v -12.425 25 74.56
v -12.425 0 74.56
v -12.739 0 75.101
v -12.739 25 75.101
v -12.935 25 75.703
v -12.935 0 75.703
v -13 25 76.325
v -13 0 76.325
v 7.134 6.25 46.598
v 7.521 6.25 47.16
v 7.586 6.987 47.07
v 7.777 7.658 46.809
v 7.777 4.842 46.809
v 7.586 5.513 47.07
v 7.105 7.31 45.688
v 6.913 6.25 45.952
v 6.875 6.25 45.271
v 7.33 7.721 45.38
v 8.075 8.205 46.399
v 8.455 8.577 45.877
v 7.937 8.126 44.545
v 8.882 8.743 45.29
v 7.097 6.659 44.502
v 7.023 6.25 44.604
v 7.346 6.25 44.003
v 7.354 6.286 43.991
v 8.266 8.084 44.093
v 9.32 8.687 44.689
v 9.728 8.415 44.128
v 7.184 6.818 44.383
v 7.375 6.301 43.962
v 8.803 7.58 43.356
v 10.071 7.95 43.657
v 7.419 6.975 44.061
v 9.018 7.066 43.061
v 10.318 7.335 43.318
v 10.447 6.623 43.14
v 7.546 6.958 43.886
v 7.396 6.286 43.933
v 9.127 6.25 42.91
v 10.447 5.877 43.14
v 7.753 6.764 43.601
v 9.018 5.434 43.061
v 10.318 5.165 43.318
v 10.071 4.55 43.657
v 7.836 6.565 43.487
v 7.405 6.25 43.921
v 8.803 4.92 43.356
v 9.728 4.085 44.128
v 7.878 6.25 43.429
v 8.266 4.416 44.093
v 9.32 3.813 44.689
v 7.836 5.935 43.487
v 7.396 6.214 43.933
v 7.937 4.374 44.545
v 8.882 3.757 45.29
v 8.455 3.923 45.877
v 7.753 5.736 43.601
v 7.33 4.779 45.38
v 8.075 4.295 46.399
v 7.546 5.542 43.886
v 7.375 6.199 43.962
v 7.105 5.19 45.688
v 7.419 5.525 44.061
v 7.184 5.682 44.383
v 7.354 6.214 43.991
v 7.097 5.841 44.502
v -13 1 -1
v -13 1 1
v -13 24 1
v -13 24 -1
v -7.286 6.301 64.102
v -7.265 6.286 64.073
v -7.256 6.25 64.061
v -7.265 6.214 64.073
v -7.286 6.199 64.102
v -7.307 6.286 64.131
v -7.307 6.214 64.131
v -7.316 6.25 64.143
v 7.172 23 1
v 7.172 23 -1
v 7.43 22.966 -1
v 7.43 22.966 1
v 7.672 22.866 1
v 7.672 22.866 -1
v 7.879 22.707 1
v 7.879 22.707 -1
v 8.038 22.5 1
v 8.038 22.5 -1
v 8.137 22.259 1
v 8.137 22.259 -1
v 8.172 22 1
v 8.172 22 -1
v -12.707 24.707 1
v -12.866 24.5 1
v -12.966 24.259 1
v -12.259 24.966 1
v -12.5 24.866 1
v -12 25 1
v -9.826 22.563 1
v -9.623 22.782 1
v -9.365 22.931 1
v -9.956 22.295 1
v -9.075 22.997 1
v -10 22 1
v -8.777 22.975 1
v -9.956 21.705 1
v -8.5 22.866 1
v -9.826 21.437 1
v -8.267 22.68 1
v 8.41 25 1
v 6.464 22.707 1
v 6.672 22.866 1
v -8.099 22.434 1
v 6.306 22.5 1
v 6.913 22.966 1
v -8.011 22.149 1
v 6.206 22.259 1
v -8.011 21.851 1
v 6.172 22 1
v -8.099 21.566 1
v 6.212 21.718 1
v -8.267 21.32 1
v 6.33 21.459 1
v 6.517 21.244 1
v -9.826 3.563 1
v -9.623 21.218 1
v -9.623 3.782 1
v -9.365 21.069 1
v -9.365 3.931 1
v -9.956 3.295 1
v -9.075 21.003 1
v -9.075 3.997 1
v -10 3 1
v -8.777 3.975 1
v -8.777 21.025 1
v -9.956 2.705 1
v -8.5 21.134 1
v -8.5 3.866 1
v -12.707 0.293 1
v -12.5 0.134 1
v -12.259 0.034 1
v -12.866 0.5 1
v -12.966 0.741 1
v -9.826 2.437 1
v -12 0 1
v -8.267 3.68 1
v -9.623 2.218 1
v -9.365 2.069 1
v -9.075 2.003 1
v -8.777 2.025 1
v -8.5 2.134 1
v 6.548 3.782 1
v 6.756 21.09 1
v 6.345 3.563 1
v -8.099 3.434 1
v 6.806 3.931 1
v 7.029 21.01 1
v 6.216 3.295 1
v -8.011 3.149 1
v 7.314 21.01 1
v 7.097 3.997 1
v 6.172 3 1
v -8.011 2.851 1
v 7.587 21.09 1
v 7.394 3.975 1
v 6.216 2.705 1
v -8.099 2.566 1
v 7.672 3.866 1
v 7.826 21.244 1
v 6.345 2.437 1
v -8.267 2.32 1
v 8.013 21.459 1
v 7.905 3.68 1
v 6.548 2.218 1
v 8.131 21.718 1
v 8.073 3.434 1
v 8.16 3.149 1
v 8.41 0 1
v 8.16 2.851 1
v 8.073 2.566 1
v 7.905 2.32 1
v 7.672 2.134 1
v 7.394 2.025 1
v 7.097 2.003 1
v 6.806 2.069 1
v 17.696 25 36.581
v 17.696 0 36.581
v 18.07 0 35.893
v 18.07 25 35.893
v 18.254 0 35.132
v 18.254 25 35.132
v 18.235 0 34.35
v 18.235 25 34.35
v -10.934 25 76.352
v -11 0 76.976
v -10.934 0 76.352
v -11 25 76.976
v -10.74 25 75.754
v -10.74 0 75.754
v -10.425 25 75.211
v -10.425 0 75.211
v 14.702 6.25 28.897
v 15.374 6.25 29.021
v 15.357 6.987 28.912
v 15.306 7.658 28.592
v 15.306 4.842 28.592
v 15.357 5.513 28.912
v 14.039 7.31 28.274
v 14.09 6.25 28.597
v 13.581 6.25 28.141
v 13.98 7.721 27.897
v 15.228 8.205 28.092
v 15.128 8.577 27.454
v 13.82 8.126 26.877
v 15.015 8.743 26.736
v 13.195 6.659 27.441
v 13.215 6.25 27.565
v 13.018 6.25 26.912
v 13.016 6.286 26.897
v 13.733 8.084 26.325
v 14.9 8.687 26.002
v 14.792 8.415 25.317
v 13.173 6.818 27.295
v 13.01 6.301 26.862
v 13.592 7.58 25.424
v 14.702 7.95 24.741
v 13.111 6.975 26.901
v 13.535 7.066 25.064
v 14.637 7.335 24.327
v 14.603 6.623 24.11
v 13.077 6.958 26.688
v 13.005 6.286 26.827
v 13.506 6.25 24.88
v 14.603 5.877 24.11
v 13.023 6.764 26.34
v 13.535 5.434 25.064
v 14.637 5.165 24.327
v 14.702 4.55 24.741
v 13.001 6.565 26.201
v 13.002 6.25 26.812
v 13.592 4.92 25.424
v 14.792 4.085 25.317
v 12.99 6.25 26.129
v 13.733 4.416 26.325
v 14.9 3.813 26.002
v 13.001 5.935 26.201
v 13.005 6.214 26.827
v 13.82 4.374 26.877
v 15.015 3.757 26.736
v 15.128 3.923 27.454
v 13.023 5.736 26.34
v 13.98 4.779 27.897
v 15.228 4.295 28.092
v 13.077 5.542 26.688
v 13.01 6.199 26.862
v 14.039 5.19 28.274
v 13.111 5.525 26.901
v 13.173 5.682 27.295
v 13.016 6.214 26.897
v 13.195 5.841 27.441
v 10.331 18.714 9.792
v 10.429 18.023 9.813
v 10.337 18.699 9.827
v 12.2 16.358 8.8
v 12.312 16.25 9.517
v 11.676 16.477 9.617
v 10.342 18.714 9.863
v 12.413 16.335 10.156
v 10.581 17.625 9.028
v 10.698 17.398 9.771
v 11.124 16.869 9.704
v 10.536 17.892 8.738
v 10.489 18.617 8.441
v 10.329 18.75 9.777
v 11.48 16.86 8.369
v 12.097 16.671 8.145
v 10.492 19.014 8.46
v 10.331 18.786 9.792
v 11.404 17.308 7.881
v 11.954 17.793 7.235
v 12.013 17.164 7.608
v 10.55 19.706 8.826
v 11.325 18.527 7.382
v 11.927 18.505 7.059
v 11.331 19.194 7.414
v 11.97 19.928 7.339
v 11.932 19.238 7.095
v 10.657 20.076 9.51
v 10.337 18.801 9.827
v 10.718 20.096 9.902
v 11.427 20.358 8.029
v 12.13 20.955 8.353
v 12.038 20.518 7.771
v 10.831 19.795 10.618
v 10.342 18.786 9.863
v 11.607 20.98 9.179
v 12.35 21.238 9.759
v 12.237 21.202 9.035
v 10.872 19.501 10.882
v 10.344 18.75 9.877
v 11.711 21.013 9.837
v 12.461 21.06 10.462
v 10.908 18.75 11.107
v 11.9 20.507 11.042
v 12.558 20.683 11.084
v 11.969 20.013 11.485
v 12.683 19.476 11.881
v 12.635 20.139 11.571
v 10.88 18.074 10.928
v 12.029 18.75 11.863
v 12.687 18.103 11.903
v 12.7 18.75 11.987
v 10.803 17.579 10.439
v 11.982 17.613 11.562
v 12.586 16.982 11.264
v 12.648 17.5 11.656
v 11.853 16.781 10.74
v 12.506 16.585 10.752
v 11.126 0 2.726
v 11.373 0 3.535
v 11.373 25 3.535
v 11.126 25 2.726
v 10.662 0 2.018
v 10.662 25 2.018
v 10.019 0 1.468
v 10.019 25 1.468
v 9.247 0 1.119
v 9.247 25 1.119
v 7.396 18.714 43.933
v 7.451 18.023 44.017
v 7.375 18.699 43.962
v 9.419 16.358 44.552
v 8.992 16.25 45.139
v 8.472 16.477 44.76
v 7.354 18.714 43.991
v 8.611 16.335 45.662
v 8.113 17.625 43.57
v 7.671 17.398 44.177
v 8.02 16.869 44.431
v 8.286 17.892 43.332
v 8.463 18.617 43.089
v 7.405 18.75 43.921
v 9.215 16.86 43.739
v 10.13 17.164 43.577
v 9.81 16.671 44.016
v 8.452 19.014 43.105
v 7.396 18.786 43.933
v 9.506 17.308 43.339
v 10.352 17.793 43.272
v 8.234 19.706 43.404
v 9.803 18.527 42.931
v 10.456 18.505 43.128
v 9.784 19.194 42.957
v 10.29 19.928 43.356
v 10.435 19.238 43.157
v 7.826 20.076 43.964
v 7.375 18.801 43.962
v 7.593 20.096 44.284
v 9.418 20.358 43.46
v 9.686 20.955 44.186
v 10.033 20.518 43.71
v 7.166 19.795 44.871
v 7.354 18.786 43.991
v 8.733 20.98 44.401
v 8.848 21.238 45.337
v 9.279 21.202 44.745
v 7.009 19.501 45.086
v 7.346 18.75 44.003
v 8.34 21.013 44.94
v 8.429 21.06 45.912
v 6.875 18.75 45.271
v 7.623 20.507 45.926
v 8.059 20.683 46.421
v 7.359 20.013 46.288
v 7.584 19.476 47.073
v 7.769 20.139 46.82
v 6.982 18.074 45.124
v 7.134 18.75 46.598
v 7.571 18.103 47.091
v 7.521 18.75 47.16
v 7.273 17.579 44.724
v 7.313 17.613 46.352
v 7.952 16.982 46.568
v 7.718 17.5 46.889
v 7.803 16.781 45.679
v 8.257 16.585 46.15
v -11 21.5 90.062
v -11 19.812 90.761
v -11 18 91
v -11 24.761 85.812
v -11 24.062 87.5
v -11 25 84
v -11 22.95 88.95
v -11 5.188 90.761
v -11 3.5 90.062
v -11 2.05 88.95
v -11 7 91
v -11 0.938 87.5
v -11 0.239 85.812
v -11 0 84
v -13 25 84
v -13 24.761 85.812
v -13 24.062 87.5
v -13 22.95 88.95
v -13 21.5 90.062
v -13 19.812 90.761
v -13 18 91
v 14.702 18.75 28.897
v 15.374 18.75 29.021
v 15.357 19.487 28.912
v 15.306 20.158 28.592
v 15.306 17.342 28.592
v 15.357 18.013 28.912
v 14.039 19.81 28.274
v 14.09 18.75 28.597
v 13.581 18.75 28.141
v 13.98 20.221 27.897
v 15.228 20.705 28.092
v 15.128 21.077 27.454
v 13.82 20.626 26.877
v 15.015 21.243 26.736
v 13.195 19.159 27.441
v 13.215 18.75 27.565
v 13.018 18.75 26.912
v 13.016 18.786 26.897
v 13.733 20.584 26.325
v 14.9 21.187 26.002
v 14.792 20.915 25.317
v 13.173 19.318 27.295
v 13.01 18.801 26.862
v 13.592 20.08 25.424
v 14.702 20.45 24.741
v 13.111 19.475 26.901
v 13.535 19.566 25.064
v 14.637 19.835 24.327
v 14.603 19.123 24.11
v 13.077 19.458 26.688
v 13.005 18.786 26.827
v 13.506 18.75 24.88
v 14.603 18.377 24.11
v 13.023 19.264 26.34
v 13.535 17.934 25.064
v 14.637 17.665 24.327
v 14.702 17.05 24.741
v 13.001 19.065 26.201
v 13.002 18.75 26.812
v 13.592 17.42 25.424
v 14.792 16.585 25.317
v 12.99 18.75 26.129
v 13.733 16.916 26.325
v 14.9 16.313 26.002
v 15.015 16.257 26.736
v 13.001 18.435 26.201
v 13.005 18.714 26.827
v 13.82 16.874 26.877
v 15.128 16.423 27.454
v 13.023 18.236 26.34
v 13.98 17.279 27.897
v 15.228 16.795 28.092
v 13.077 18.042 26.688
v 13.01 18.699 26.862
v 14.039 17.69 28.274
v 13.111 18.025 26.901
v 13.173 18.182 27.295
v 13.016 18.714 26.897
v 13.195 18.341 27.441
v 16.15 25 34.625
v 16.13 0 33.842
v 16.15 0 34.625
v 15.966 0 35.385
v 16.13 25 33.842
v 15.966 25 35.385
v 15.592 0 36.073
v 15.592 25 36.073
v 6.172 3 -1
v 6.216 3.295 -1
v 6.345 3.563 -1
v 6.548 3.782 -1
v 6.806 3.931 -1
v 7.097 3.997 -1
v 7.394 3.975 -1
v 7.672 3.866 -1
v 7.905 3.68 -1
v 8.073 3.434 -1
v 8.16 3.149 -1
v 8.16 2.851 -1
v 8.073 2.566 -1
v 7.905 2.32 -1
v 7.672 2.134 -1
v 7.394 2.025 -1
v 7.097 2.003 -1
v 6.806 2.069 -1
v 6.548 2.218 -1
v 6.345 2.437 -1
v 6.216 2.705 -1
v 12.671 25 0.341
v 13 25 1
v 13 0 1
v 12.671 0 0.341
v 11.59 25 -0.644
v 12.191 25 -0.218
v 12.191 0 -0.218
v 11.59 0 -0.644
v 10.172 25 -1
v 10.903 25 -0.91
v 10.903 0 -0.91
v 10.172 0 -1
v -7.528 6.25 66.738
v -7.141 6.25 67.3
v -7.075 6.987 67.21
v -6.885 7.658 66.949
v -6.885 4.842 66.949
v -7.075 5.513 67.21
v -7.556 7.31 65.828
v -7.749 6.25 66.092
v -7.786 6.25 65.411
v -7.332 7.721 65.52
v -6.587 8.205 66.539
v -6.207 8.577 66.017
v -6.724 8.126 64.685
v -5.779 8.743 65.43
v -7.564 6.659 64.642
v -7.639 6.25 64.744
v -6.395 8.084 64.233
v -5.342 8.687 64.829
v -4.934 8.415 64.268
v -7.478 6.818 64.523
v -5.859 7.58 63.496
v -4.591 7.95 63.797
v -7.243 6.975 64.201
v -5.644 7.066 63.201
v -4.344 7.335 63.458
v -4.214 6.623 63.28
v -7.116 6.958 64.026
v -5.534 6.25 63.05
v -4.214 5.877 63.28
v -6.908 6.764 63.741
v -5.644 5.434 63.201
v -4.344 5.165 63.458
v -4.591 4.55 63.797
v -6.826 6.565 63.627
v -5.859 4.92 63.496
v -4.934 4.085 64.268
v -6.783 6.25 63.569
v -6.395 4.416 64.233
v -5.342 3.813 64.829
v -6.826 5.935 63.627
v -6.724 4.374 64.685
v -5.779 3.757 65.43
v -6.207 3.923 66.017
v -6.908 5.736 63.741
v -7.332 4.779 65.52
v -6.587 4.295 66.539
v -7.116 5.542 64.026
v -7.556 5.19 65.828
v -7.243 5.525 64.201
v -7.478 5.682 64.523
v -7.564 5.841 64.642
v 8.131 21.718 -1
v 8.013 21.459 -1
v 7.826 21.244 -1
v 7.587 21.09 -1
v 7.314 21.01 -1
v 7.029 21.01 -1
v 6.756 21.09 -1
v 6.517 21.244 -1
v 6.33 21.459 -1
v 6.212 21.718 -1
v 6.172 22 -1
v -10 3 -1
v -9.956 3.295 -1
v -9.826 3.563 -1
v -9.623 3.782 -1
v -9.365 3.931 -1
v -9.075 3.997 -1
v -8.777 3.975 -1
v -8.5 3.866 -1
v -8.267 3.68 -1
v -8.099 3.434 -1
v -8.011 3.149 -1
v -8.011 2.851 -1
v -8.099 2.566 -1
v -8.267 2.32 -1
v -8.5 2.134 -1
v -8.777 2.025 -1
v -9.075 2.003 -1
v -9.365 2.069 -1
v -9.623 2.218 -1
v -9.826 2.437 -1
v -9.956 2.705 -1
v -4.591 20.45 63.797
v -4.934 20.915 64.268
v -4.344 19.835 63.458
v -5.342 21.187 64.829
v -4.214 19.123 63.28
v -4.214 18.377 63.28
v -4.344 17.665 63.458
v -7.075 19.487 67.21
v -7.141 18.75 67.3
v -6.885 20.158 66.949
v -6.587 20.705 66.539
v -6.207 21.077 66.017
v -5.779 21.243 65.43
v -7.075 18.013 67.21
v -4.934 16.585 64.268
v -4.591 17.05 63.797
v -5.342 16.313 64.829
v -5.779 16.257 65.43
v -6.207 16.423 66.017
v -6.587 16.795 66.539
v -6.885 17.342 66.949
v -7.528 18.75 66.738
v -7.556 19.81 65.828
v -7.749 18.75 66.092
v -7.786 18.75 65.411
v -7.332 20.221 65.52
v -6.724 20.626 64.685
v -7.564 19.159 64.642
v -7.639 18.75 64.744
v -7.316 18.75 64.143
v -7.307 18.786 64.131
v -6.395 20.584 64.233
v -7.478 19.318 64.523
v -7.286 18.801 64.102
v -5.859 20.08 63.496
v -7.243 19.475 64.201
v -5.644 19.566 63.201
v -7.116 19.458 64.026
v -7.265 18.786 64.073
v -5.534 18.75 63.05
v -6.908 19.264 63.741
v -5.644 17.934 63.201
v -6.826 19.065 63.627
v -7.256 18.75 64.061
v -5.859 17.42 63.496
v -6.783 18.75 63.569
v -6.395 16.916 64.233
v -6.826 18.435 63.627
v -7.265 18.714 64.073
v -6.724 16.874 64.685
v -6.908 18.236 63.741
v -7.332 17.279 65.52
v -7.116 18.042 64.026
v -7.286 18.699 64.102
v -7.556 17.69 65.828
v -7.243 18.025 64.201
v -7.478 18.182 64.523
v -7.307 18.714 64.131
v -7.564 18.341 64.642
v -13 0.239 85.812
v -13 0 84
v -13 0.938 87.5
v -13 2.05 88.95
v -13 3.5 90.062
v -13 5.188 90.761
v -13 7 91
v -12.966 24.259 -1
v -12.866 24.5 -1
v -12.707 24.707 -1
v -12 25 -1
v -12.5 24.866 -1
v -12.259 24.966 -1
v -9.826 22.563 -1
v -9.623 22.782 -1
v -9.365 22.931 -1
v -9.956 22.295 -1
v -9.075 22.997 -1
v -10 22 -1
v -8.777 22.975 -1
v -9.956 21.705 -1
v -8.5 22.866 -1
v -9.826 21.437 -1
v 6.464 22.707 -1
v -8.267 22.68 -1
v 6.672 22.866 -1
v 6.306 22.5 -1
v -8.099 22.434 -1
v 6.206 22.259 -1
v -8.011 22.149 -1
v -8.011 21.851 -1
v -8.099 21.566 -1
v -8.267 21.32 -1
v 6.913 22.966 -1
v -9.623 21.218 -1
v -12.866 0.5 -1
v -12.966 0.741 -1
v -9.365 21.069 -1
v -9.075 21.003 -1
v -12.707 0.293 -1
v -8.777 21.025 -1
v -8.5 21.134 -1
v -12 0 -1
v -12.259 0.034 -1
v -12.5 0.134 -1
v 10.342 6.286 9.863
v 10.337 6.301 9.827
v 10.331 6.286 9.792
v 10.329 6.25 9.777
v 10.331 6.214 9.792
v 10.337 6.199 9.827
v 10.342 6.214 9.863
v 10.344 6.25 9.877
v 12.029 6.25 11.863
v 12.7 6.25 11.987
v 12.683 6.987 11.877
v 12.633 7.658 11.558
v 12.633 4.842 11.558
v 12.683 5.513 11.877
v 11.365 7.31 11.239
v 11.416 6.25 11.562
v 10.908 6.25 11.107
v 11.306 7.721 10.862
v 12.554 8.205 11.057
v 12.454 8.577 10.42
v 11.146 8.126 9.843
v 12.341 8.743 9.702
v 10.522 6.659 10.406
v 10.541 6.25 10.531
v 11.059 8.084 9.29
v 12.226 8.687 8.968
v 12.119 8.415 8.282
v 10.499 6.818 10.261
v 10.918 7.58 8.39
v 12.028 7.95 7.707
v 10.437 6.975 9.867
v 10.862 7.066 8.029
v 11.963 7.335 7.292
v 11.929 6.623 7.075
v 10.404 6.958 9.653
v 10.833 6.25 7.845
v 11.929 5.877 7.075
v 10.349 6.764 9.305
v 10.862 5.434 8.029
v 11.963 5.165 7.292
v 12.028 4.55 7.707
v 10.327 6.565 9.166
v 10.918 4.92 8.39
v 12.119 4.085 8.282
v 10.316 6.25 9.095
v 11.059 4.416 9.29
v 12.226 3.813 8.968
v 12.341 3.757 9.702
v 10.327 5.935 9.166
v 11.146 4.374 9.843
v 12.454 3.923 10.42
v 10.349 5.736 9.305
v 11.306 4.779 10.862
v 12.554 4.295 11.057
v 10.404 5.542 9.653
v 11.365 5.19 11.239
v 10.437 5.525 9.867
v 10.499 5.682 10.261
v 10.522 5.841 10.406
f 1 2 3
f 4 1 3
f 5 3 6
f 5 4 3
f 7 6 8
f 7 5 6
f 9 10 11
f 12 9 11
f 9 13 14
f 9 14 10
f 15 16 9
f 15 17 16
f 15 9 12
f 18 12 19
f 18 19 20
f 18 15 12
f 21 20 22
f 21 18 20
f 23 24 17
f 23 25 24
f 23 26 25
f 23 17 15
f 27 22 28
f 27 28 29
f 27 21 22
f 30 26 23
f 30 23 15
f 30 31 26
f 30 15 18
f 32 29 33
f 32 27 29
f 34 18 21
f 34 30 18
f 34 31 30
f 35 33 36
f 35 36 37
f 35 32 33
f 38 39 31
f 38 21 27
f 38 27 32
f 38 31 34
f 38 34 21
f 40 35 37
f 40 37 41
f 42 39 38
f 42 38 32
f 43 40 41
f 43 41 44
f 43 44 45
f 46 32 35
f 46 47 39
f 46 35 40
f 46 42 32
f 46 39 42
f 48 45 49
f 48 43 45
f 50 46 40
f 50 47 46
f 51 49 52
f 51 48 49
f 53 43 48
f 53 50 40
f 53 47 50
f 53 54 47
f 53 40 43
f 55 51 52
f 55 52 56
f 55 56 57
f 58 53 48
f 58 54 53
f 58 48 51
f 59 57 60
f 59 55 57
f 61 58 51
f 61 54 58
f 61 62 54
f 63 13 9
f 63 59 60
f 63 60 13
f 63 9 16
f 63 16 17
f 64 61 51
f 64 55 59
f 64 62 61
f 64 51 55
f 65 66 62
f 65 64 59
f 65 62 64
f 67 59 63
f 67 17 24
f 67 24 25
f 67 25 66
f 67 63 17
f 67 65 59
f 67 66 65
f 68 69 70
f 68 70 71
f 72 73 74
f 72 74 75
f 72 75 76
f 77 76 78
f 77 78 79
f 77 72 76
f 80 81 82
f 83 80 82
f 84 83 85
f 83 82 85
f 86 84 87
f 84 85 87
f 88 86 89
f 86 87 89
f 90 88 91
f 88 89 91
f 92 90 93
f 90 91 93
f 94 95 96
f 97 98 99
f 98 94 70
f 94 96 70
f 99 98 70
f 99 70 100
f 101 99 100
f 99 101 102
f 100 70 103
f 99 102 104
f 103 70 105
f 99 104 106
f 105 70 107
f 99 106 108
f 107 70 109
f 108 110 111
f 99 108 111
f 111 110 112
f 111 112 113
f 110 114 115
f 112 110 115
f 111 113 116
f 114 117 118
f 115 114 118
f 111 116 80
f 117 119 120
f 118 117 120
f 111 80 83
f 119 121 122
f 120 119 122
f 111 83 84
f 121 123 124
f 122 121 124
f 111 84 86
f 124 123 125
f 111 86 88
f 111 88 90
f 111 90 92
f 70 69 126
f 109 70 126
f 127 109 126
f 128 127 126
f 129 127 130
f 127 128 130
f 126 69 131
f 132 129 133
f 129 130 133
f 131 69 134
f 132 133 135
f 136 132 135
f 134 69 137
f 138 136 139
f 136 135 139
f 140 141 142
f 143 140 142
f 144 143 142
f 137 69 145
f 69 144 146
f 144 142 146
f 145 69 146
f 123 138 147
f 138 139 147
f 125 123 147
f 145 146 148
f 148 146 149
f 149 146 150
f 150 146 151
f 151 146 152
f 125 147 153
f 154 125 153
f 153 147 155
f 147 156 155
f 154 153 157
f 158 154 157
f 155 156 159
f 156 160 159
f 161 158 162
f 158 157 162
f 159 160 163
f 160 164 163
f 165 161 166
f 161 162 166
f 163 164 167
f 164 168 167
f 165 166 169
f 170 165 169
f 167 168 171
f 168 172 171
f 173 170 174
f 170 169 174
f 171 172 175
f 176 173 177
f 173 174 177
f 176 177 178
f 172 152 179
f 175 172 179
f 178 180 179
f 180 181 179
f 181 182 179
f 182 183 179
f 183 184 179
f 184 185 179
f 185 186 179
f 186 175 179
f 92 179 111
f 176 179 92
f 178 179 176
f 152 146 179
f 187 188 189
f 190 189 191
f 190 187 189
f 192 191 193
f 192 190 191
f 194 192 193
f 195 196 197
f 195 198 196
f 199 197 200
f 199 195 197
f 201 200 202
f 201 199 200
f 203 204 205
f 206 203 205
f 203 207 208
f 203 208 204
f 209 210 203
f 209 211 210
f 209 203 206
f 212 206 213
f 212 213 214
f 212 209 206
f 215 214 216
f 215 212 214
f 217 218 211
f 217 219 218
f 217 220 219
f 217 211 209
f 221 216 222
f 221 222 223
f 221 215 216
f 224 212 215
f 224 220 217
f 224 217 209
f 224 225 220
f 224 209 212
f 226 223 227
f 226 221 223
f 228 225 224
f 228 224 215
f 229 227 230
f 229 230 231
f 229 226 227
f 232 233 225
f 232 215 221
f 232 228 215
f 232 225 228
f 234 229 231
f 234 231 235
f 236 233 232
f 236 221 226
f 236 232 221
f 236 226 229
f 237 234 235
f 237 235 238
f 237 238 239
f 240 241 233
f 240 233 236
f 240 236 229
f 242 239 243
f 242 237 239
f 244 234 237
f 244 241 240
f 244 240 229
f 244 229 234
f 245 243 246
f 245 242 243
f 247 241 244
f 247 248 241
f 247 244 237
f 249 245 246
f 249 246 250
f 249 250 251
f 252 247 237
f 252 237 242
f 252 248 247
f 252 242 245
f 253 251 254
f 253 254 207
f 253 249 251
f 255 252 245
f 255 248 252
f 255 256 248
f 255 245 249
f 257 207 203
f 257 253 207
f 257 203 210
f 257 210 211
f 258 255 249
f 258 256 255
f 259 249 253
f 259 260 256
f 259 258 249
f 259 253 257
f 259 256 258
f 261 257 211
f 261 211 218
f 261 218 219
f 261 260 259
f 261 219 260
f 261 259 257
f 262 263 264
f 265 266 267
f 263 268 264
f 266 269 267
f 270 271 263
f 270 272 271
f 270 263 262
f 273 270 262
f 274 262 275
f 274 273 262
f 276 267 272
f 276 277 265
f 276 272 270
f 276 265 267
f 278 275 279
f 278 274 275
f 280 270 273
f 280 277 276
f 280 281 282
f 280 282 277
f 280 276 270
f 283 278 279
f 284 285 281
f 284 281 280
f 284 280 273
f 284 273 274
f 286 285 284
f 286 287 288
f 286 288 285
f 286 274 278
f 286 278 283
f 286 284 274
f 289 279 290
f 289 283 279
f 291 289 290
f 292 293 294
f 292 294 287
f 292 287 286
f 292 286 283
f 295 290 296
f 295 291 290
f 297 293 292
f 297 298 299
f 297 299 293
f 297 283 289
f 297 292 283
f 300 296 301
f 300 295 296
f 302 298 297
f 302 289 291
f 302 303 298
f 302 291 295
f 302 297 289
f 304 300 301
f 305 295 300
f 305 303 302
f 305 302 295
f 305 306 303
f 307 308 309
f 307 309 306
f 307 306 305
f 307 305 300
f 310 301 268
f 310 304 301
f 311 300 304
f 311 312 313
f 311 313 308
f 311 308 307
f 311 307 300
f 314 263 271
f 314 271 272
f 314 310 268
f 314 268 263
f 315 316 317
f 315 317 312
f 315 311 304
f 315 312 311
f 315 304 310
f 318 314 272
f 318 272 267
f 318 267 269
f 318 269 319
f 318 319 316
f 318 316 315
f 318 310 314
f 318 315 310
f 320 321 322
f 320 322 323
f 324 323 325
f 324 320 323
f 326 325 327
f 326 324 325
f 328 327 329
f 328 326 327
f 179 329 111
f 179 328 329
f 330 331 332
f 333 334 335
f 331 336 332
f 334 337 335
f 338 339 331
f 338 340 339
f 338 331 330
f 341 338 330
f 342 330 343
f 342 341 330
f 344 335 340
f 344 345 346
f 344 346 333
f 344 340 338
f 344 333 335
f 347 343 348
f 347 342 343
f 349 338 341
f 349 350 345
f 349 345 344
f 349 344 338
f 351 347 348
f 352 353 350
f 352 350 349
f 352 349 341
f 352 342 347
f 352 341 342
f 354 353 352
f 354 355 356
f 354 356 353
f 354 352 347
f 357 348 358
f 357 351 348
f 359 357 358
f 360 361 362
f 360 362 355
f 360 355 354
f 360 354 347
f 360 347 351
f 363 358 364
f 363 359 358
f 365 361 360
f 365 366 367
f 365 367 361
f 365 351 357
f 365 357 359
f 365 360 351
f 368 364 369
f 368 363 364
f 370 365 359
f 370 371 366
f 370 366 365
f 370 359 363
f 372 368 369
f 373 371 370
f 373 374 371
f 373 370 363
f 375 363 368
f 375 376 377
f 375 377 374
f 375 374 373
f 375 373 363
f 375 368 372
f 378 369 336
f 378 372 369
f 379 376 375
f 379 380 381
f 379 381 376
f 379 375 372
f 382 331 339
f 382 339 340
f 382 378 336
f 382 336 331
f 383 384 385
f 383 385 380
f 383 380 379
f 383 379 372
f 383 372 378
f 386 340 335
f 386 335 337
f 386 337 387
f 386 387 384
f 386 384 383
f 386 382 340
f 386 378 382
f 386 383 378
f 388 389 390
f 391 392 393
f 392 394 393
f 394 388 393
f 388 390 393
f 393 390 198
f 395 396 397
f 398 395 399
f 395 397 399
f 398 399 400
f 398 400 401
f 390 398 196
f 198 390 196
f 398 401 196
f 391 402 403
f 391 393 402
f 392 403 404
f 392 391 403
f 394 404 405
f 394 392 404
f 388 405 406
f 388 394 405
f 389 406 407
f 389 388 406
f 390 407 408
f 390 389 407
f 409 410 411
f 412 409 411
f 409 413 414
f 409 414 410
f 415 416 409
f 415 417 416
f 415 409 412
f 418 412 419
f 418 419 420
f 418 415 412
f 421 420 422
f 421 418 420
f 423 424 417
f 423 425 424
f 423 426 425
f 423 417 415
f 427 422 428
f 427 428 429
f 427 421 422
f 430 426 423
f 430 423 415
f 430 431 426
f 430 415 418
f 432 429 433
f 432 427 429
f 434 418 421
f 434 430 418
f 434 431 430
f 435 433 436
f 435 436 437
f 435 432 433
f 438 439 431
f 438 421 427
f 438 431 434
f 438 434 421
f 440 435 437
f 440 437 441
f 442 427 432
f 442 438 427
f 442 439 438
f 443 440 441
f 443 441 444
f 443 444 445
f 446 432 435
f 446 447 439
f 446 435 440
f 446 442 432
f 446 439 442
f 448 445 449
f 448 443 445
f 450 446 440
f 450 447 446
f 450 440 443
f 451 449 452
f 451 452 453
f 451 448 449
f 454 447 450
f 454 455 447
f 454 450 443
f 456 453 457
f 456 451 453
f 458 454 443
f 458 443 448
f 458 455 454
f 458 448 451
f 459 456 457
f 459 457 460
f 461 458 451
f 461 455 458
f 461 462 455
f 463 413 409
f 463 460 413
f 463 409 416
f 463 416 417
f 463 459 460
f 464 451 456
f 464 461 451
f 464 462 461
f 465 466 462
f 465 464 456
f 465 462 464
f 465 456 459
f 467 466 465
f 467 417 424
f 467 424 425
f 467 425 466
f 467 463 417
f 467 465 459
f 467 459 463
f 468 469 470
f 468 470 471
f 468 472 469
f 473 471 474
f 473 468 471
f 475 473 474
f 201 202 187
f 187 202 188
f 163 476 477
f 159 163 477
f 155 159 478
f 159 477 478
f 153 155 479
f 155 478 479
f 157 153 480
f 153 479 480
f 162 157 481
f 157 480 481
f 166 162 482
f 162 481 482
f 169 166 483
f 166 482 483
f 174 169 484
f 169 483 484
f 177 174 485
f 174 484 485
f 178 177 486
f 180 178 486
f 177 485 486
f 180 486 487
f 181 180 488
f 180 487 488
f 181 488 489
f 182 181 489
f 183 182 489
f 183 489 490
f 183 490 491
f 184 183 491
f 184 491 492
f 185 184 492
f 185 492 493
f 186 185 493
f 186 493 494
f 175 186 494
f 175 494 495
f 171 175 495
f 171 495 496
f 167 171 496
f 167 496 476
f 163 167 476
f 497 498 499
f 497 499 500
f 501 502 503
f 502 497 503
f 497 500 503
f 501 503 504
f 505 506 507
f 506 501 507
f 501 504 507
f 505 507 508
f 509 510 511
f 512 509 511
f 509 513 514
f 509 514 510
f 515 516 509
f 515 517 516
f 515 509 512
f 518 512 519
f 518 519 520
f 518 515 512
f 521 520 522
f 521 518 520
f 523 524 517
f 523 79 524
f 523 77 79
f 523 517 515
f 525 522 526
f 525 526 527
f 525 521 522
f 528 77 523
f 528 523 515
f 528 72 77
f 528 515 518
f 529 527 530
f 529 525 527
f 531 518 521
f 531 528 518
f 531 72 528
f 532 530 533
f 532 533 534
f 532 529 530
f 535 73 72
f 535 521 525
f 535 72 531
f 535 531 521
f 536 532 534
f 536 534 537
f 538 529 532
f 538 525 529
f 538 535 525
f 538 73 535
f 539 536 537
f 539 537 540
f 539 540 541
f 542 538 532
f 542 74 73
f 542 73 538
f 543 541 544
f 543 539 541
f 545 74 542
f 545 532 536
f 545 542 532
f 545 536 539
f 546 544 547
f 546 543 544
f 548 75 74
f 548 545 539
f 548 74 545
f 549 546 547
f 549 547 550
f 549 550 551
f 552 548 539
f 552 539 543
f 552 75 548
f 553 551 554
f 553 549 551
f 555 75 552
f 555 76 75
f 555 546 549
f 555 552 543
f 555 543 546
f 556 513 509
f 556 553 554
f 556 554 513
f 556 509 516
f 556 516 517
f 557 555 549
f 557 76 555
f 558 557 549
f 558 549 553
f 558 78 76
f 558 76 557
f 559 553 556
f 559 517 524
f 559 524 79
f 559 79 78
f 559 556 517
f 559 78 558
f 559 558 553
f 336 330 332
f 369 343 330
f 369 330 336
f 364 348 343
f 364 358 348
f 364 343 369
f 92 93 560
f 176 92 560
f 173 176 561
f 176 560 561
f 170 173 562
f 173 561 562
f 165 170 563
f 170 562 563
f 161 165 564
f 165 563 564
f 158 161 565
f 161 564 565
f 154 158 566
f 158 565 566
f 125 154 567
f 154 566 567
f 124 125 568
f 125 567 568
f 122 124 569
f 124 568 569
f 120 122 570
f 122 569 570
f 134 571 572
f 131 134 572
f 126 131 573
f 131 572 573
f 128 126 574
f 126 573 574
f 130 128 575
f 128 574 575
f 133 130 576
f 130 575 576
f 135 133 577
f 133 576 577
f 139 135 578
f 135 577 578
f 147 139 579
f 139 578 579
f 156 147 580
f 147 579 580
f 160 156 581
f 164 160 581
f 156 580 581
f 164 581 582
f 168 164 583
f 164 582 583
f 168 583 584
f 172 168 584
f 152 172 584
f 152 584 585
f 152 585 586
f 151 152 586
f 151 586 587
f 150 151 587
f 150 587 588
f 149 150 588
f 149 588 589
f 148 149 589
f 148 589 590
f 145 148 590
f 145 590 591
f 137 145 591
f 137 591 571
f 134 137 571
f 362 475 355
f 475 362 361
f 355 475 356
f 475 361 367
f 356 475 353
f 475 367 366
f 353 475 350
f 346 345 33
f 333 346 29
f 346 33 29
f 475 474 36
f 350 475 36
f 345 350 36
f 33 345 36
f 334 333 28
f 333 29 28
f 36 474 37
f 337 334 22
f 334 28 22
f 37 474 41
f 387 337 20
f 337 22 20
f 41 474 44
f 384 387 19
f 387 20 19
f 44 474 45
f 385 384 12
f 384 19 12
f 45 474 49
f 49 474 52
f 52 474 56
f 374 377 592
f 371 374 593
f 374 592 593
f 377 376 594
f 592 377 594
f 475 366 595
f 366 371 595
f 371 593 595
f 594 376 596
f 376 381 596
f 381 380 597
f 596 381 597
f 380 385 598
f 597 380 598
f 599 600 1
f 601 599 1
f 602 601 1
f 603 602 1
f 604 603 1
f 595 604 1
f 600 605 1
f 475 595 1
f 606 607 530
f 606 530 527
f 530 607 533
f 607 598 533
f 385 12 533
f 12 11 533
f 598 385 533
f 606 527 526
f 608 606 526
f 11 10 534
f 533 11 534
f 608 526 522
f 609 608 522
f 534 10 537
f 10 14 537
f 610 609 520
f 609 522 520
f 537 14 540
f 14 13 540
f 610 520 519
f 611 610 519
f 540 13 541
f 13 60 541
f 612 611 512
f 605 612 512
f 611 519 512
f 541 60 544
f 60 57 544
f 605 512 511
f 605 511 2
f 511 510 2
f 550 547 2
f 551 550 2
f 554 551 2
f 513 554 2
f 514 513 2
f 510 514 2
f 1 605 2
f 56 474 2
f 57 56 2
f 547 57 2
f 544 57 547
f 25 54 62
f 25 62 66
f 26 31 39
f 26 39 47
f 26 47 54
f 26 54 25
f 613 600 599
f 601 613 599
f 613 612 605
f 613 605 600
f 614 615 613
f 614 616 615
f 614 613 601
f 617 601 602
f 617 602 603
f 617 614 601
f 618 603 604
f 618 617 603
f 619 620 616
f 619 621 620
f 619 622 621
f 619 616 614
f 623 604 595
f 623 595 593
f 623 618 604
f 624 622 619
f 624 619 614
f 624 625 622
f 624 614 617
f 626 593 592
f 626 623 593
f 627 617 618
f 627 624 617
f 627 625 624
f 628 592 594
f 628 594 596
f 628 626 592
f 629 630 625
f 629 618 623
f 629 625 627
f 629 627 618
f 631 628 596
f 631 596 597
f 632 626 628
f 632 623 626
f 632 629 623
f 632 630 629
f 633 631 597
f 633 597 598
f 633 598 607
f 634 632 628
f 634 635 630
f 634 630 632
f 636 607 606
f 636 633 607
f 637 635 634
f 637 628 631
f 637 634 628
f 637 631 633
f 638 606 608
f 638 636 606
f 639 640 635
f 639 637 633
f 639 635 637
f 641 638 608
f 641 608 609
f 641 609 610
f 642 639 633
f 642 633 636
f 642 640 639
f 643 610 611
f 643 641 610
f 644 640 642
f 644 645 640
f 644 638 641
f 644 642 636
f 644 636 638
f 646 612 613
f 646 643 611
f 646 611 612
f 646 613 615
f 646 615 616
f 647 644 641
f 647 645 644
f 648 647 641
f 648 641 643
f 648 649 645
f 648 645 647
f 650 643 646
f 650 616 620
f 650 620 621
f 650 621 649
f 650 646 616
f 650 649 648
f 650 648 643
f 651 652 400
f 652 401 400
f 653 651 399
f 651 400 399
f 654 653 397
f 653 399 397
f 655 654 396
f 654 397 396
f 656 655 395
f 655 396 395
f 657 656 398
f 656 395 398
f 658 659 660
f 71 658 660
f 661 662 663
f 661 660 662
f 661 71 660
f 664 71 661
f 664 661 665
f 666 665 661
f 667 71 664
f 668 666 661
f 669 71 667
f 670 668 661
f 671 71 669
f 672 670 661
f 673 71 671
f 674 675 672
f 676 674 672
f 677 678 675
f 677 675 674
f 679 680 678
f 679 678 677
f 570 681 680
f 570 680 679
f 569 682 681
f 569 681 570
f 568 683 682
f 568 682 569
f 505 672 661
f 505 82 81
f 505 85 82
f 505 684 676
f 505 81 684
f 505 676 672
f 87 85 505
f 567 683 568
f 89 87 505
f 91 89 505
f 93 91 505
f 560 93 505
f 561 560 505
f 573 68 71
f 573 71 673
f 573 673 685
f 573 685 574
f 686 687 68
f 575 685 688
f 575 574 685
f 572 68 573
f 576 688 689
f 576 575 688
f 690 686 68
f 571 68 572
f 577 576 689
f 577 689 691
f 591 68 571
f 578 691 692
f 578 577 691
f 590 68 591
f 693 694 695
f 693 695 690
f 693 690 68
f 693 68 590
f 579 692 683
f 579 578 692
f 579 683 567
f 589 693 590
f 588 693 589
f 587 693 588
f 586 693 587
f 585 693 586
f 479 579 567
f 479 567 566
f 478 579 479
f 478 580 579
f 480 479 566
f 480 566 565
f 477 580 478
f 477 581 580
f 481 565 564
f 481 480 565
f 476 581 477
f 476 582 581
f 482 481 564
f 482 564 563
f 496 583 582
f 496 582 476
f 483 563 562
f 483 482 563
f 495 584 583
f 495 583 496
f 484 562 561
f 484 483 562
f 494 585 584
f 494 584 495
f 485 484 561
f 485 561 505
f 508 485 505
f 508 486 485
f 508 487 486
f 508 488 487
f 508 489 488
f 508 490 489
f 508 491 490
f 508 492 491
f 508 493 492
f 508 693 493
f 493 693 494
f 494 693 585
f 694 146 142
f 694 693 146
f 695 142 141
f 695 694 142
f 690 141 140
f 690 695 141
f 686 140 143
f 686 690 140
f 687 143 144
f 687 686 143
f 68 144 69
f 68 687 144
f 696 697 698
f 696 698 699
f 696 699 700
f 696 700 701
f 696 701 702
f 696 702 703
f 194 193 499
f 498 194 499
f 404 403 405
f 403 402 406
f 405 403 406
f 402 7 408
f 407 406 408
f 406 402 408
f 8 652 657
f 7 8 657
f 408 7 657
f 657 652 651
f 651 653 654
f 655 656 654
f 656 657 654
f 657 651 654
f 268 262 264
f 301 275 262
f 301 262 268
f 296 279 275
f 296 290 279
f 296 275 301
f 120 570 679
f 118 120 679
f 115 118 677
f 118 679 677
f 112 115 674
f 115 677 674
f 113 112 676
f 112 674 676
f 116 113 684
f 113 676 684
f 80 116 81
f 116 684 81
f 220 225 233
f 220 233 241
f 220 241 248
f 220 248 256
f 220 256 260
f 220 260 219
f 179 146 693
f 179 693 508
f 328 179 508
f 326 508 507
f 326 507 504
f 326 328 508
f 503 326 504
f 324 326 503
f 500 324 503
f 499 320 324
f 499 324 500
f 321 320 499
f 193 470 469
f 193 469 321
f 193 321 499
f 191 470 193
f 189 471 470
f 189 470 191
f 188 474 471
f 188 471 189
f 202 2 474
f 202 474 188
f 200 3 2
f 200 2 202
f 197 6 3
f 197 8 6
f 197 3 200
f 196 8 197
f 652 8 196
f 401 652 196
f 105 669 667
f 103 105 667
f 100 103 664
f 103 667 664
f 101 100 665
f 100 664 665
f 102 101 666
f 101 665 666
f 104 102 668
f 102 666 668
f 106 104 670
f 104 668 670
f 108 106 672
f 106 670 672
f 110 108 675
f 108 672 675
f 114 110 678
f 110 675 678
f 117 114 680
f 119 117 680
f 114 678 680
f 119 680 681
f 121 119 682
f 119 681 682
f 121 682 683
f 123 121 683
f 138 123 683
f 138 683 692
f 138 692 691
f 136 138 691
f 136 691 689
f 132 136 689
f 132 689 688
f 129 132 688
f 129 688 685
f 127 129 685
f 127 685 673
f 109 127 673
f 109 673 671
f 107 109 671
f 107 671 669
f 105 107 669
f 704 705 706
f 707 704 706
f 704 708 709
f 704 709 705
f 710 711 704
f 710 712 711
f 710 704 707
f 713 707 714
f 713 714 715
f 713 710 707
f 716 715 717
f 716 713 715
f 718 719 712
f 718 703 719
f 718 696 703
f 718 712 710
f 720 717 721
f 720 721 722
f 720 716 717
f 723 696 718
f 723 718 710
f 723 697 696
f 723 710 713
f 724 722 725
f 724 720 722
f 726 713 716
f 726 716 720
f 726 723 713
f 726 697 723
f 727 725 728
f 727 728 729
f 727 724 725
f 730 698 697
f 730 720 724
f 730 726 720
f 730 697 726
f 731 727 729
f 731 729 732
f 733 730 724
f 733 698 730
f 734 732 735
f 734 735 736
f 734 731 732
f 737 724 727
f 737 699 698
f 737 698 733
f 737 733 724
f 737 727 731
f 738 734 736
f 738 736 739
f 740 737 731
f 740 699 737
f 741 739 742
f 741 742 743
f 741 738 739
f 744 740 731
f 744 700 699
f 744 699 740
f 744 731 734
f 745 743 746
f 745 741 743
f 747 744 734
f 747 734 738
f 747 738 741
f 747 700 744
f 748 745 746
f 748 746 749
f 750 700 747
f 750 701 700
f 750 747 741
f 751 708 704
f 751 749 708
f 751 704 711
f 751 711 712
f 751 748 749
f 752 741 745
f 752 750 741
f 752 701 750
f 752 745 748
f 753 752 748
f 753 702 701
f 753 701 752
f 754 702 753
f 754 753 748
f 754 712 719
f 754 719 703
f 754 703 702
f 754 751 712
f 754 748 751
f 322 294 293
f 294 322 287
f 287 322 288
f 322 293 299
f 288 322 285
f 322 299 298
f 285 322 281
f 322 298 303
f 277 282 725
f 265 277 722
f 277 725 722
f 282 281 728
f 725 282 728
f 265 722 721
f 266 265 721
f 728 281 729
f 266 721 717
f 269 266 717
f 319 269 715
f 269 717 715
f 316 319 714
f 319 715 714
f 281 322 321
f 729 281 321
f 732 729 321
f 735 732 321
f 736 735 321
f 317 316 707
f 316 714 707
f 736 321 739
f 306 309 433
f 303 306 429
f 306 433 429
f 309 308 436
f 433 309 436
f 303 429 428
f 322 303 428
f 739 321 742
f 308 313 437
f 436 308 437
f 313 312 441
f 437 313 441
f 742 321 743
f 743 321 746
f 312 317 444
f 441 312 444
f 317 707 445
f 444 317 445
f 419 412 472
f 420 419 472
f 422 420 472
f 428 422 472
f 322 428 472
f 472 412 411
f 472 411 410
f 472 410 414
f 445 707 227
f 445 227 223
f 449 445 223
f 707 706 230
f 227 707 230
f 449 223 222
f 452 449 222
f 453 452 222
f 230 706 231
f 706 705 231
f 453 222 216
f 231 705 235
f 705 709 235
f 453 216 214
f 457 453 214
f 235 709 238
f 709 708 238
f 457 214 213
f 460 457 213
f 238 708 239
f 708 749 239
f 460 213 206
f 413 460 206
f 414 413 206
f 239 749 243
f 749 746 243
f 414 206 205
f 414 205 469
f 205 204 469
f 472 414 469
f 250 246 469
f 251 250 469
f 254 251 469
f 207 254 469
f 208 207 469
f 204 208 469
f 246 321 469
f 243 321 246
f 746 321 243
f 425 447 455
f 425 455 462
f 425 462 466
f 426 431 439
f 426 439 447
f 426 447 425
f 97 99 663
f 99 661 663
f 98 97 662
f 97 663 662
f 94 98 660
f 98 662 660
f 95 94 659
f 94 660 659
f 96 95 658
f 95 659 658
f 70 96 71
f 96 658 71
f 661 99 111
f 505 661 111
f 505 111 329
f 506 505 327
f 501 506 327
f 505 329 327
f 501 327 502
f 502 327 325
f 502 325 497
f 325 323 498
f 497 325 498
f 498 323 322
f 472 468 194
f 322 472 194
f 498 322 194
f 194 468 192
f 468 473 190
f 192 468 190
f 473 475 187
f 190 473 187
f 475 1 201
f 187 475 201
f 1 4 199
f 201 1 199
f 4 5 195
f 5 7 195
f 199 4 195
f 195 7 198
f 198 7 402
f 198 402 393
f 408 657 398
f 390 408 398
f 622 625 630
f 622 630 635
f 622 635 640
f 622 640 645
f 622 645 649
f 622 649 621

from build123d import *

# Parameters (mm, degrees)
SKETCH1_W           = 2
SKETCH1_H           = 15
SKETCH1_W_2         = 26
SKETCH1_H_2         = 2
BOSS_EXTRUDE1_DEPTH = 25
SKETCH2_R           = 2.5
BOSS_EXTRUDE2_DEPTH = 2
SKETCH3_R           = 2.5
BOSS_EXTRUDE3_DEPTH = 2
FILLET1_R           = 2.5
FILLET2_R           = 7
FILLET3_R           = 1
FILLET4_R           = 3
FILLET5_R           = 3
FILLET6_R           = 3
CUT_EXTRUDE2_REACH  = 99.071
SKETCH8_R           = 1


with BuildPart() as part:
    # Sketch1 → Boss-Extrude1 (new body)
    with BuildSketch(Plane(origin=(0, 0, 0), x_dir=(1, 0, 0), z_dir=(0, 1, 0))):
        Polygon((-12.616932988, -74.822915589), (-13, -75.349125674), (-13, -76), (-11, -76), (18.427110278, -35.576675289), (13, -1), (10.975513857, -1), (11.024189983, -1.310120587), (16.322926791, -35.068915352), align=None)
        with Locations((-12, -83.5)):
            Rectangle(SKETCH1_W, SKETCH1_H)
        Rectangle(SKETCH1_W_2, SKETCH1_H_2)
    extrude(amount=BOSS_EXTRUDE1_DEPTH)

    # Sketch2 → Boss-Extrude2 (add)
    with BuildSketch(Plane(origin=(10.558437112, 0, -1.657238647), x_dir=(0.15506029365043303, 0, 0.9879050082538512), z_dir=(-0.9879050082538512, 0, 0.15506029365043303))):
        with Locations((28.554289051, 18.75)):
            Circle(SKETCH2_R)
        with BuildLine():
            ThreePointArc((11.31127729, 16.25), (13.079044243, 16.982233047), (13.81127729, 18.75))
            Line((13.81127729, 18.75), (11.31127729, 18.75))
            Line((11.31127729, 18.75), (11.31127729, 16.25))
        make_face()
        with BuildLine():
            Line((11.31127729, 18.75), (13.81127729, 18.75))
            ThreePointArc((13.81127729, 18.75), (9.543510337, 20.517766953), (11.31127729, 16.25))
            Line((11.31127729, 16.25), (11.31127729, 18.75))
        make_face()
        with Locations((11.31127729, 6.25)):
            Circle(SKETCH2_R)
        with Locations((28.554289051, 6.25)):
            Circle(SKETCH2_R)
    extrude(amount=BOSS_EXTRUDE2_DEPTH)

    # Sketch3 → Boss-Extrude3 (add)
    with BuildSketch(Plane(origin=(27.355333892, 0, 19.913958906), x_dir=(-0.5885422055553007, 0, 0.8084664942223037), z_dir=(-0.8084664942223037, 0, -0.5885422055553007))):
        with BuildLine():
            ThreePointArc((33.701056824, 18.75), (29.433289871, 20.517766953), (31.201056824, 16.25))
            Line((31.201056824, 16.25), (31.201056824, 18.75))
            Line((31.201056824, 18.75), (33.701056824, 18.75))
        make_face()
        with BuildLine():
            Line((31.201056824, 18.75), (31.201056824, 16.25))
            ThreePointArc((31.201056824, 16.25), (32.968823777, 16.982233047), (33.701056824, 18.75))
            Line((33.701056824, 18.75), (31.201056824, 18.75))
        make_face()
        with Locations((31.201056824, 6.25)):
            Circle(SKETCH3_R)
        with Locations((56.11254704, 6.25)):
            Circle(SKETCH3_R)
        with Locations((56.11254704, 18.75)):
            Circle(SKETCH3_R)
    extrude(amount=BOSS_EXTRUDE3_DEPTH)

    # Fillet1
    # the kernel refuses this fillet: 2.5 mm, written as the material it takes off along each edge
    with BuildSketch(Plane(origin=(13.010263541, 18.75, 26.861807101), x_dir=(0.1550602936504321, 0, 0.9879050082538512), z_dir=(0, -1, 0))) as fillet1_piece_1:
        with BuildLine():
            CenterArc((0.050510257, -2.5), FILLET1_R, 11.536959033, 78.463040967)
            Line((0.050510257, 0), (0.050510257, 0.05))
            Line((0.050510257, 0.05), (2.5, 0.05))
            Line((2.5, 0.05), (2.55, 0))
            ThreePointArc((2.55, 0), (2.55, -1), (2.548989795, -1.99))
            Line((2.548989795, -1.99), (2.5, -2))
        make_face()
    revolve(axis=Axis((13.010263541, 18.75, 26.861807101), (-0.9879050082538512, 0, 0.15506029365043303)), mode=Mode.SUBTRACT)
    with BuildSketch(Plane(origin=(10.336557074, 18.75, 9.827349425), x_dir=(0, -1, 0), z_dir=(0.1550602936504327, 1.65855285874559e-14, 0.9879050082538511))) as fillet1_piece_2:
        with BuildLine():
            CenterArc((0.050510257, 2.5), FILLET1_R, 270, 78.463040967)
            Line((0.050510257, 0), (0.050510257, -0.05))
            Line((0.050510257, -0.05), (2.5, -0.05))
            Line((2.5, -0.05), (2.55, 0))
            ThreePointArc((2.55, 0), (2.55, 1), (2.548989795, 1.99))
            Line((2.548989795, 1.99), (2.5, 2))
        make_face()
    revolve(axis=Axis((10.336557074, 18.75, 9.827349425), (0.9879050082538511, 0, -0.1550602936504327)), mode=Mode.SUBTRACT)
    with BuildSketch(Plane(origin=(10.336557074, 6.25, 9.827349425), x_dir=(0.1550602936504327, 0, 0.9879050082538511), z_dir=(0, -1, 0))) as fillet1_piece_3:
        with BuildLine():
            CenterArc((0.050510257, -2.5), FILLET1_R, 11.536959033, 78.463040967)
            Line((0.050510257, 0), (0.050510257, 0.05))
            Line((0.050510257, 0.05), (2.5, 0.05))
            Line((2.5, 0.05), (2.55, 0))
            ThreePointArc((2.55, 0), (2.55, -1), (2.548989795, -1.99))
            Line((2.548989795, -1.99), (2.5, -2))
        make_face()
    revolve(axis=Axis((10.336557074, 6.25, 9.827349425), (-0.9879050082538512, 0, 0.15506029365043303)), mode=Mode.SUBTRACT)
    with BuildSketch(Plane(origin=(13.010263541, 6.25, 26.861807101), x_dir=(0.1550602936504321, 0, 0.9879050082538512), z_dir=(0, -1, 0))) as fillet1_piece_4:
        with BuildLine():
            CenterArc((0.050510257, -2.5), FILLET1_R, 11.536959033, 78.463040967)
            Line((0.050510257, 0), (0.050510257, 0.05))
            Line((0.050510257, 0.05), (2.5, 0.05))
            Line((2.5, 0.05), (2.55, 0))
            ThreePointArc((2.55, 0), (2.55, -1), (2.548989795, -1.99))
            Line((2.548989795, -1.99), (2.5, -2))
        make_face()
    revolve(axis=Axis((13.010263541, 6.25, 26.861807101), (-0.9879050082538512, 0, 0.15506029365043303)), mode=Mode.SUBTRACT)
    with BuildSketch(Plane(origin=(7.375262105, 18.75, 43.961883521), x_dir=(0, -1, 0), z_dir=(-0.5885422055553015, 1.776176572418508e-14, 0.8084664942223031))) as fillet1_piece_5:
        with BuildLine():
            CenterArc((0.050510257, 2.5), FILLET1_R, 270, 78.463040967)
            Line((0.050510257, 0), (0.050510257, -0.05))
            Line((0.050510257, -0.05), (2.5, -0.05))
            Line((2.5, -0.05), (2.55, 0))
            ThreePointArc((2.55, 0), (2.55, 1), (2.548989795, 1.99))
            Line((2.548989795, 1.99), (2.5, 2))
        make_face()
    revolve(axis=Axis((7.375262105, 18.75, 43.961883521), (0.8084664942223031, 0, 0.5885422055553015)), mode=Mode.SUBTRACT)
    with BuildSketch(Plane(origin=(7.375262105, 6.25, 43.961883521), x_dir=(-0.5885422055553018, 0, 0.8084664942223029), z_dir=(0, -1, 0))) as fillet1_piece_6:
        with BuildLine():
            CenterArc((0.050510257, -2.5), FILLET1_R, 11.536959033, 78.463040967)
            Line((0.050510257, 0), (0.050510257, 0.05))
            Line((0.050510257, 0.05), (2.5, 0.05))
            Line((2.5, 0.05), (2.55, 0))
            ThreePointArc((2.55, 0), (2.55, -1), (2.548989795, -1.99))
            Line((2.548989795, -1.99), (2.5, -2))
        make_face()
    revolve(axis=Axis((7.375262105, 6.25, 43.961883521), (-0.8084664942223037, 0, -0.5885422055553007)), mode=Mode.SUBTRACT)
    with BuildSketch(Plane(origin=(-7.286201291, 6.25, 64.101988682), x_dir=(-0.5885422055552982, 0, 0.8084664942223055), z_dir=(0, -1, 0))) as fillet1_piece_7:
        with BuildLine():
            CenterArc((0.050510257, -2.5), FILLET1_R, 11.536959033, 78.463040967)
            Line((0.050510257, 0), (0.050510257, 0.05))
            Line((0.050510257, 0.05), (2.5, 0.05))
            Line((2.5, 0.05), (2.55, 0))
            ThreePointArc((2.55, 0), (2.55, -1), (2.548989795, -1.99))
            Line((2.548989795, -1.99), (2.5, -2))
        make_face()
    revolve(axis=Axis((-7.286201291, 6.25, 64.101988682), (-0.8084664942223037, 0, -0.5885422055553007)), mode=Mode.SUBTRACT)
    with BuildSketch(Plane(origin=(-7.286201291, 18.75, 64.101988682), x_dir=(-0.5885422055552982, 0, 0.8084664942223055), z_dir=(0, -1, 0))) as fillet1_piece_8:
        with BuildLine():
            CenterArc((0.050510257, -2.5), FILLET1_R, 11.536959033, 78.463040967)
            Line((0.050510257, 0), (0.050510257, 0.05))
            Line((0.050510257, 0.05), (2.5, 0.05))
            Line((2.5, 0.05), (2.55, 0))
            ThreePointArc((2.55, 0), (2.55, -1), (2.548989795, -1.99))
            Line((2.548989795, -1.99), (2.5, -2))
        make_face()
    revolve(axis=Axis((-7.286201291, 18.75, 64.101988682), (-0.8084664942223037, 0, -0.5885422055553007)), mode=Mode.SUBTRACT)

    # Fillet2
    fillet2_edges = [part.edges().sort_by_distance(p)[0] for p in [
        (-12, 25, 91),
        (-12, 0, 91),
    ]]
    fillet(fillet2_edges, radius=FILLET2_R)

    # Fillet3
    fillet3_edges = [part.edges().sort_by_distance(p)[0] for p in [
        (-13, 0, 0),
        (-13, 25, 0),
    ]]
    fillet(fillet3_edges, radius=FILLET3_R)

    # Fillet4
    # the kernel refuses this fillet: 3 mm, written as the material it adds along each edge
    with BuildSketch(Plane(origin=(10.975513857, 0, 1), x_dir=(-1, 0, 0), z_dir=(0, 1, 0))) as fillet4_piece_1:
        with BuildLine():
            CenterArc((FILLET4_R * 0.855284363669, FILLET4_R), FILLET4_R, 188.920293103, 81.079706897)
            Line((-FILLET4_R * 0.132620644585, FILLET4_R * 0.84493970635), (0, 0))
            Line((0, 0), (FILLET4_R * 0.855284363669, 0))
        make_face()
    extrude(amount=25)
    # the kernel refuses this fillet: 3 mm, written as the material it takes off along each edge
    with BuildSketch(Plane(origin=(13, -7.071067812, -1), x_dir=(-1, 0, 0), z_dir=(0, 1, 0))) as fillet4_2_piece_1:
        with BuildLine():
            CenterArc((2.828427125, 3), FILLET4_R, 199.471220634, 70.528779366)
            Line((0, 2), (0, 0))
            Line((0, 0), (2.828427125, 0))
        make_face()
    extrude(amount=39.142135624, mode=Mode.SUBTRACT)

    # Fillet5
    fillet5_edges = [part.edges().sort_by_distance(p)[0] for p in [
        (16.322926791, 12.5, 35.068915352),
        (18.427110278, 12.5, 35.576675289),
    ]]
    fillet(fillet5_edges, radius=FILLET5_R)

    # Fillet6
    fillet6_edges = [part.edges().sort_by_distance(p)[0] for p in [
        (-11, 12.5, 76),
        (-13, 12.5, 75.349125674),
    ]]
    fillet(fillet6_edges, radius=FILLET6_R)

    # Sketch8 → Cut-Extrude2 (cut, up to next)
    with BuildSketch(Plane(origin=(0, 0, -1), x_dir=(-1, 0, 0), z_dir=(0, 0, -1)), mode=Mode.PRIVATE) as cut_extrude2_sk1:
        with Locations((-7.171572875, 3)):
            Circle(SKETCH8_R)
    cut_extrude2_tool1 = extrude(cut_extrude2_sk1.sketch, amount=-CUT_EXTRUDE2_REACH, mode=Mode.PRIVATE) & part.part
    # Sketch8 → Cut-Extrude2 (cut, up to next)
    with BuildSketch(Plane(origin=(0, 0, -1), x_dir=(-1, 0, 0), z_dir=(0, 0, -1)), mode=Mode.PRIVATE) as cut_extrude2_sk2:
        with BuildLine():
            ThreePointArc((-7.171572875, 23), (-7.878679656, 22.707106781), (-8.171572875, 22))
            Line((-8.171572875, 22), (-7.171572875, 22))
            Line((-7.171572875, 22), (-7.171572875, 23))
        make_face()
    cut_extrude2_tool2 = extrude(cut_extrude2_sk2.sketch, amount=-CUT_EXTRUDE2_REACH, mode=Mode.PRIVATE) & part.part
    # Sketch8 → Cut-Extrude2 (cut, up to next)
    with BuildSketch(Plane(origin=(0, 0, -1), x_dir=(-1, 0, 0), z_dir=(0, 0, -1)), mode=Mode.PRIVATE) as cut_extrude2_sk3:
        with BuildLine():
            Line((-7.171572875, 22), (-8.171572875, 22))
            ThreePointArc((-8.171572875, 22), (-7.171572875, 21), (-6.171572875, 22))
            ThreePointArc((-6.171572875, 22), (-6.464466094, 22.707106781), (-7.171572875, 23))
            Line((-7.171572875, 23), (-7.171572875, 22))
        make_face()
    cut_extrude2_tool3 = extrude(cut_extrude2_sk3.sketch, amount=-CUT_EXTRUDE2_REACH, mode=Mode.PRIVATE) & part.part
    # Sketch8 → Cut-Extrude2 (cut, up to next)
    with BuildSketch(Plane(origin=(0, 0, -1), x_dir=(-1, 0, 0), z_dir=(0, 0, -1)), mode=Mode.PRIVATE) as cut_extrude2_sk4:
        with BuildLine():
            ThreePointArc((-7.171572875, 23), (-7.878679656, 22.707106781), (-8.171572875, 22))
            Line((-8.171572875, 22), (-7.171572875, 22))
            Line((-7.171572875, 22), (-7.171572875, 23))
        make_face()
    cut_extrude2_tool4 = extrude(cut_extrude2_sk4.sketch, amount=-CUT_EXTRUDE2_REACH, mode=Mode.PRIVATE) & part.part
    # Sketch8 → Cut-Extrude2 (cut, up to next)
    with BuildSketch(Plane(origin=(0, 0, -1), x_dir=(-1, 0, 0), z_dir=(0, 0, -1)), mode=Mode.PRIVATE) as cut_extrude2_sk5:
        with BuildLine():
            Line((-7.171572875, 22), (-8.171572875, 22))
            ThreePointArc((-8.171572875, 22), (-7.171572875, 21), (-6.171572875, 22))
            ThreePointArc((-6.171572875, 22), (-6.464466094, 22.707106781), (-7.171572875, 23))
            Line((-7.171572875, 23), (-7.171572875, 22))
        make_face()
    cut_extrude2_tool5 = extrude(cut_extrude2_sk5.sketch, amount=-CUT_EXTRUDE2_REACH, mode=Mode.PRIVATE) & part.part
    # Sketch8 → Cut-Extrude2 (cut, up to next)
    with BuildSketch(Plane(origin=(0, 0, -1), x_dir=(-1, 0, 0), z_dir=(0, 0, -1)), mode=Mode.PRIVATE) as cut_extrude2_sk6:
        with Locations((9, 22)):
            Circle(SKETCH8_R)
    cut_extrude2_tool6 = extrude(cut_extrude2_sk6.sketch, amount=-CUT_EXTRUDE2_REACH, mode=Mode.PRIVATE) & part.part
    # Sketch8 → Cut-Extrude2 (cut, up to next)
    with BuildSketch(Plane(origin=(0, 0, -1), x_dir=(-1, 0, 0), z_dir=(0, 0, -1)), mode=Mode.PRIVATE) as cut_extrude2_sk7:
        with Locations((9, 3)):
            Circle(SKETCH8_R)
    cut_extrude2_tool7 = extrude(cut_extrude2_sk7.sketch, amount=-CUT_EXTRUDE2_REACH, mode=Mode.PRIVATE) & part.part
    add(cut_extrude2_tool1.solids().sort_by_distance((7.171573, 3, -1))[0], mode=Mode.SUBTRACT)
    add(cut_extrude2_tool2.solids().sort_by_distance((7.595986, 22.424413, -1))[0], mode=Mode.SUBTRACT)
    add(cut_extrude2_tool3.solids().sort_by_distance((7.030102, 21.858529, -1))[0], mode=Mode.SUBTRACT)
    add(cut_extrude2_tool4.solids().sort_by_distance((7.595986, 22.424413, -1))[0], mode=Mode.SUBTRACT)
    add(cut_extrude2_tool5.solids().sort_by_distance((7.030102, 21.858529, -1))[0], mode=Mode.SUBTRACT)
    add(cut_extrude2_tool6.solids().sort_by_distance((-9, 22, -1))[0], mode=Mode.SUBTRACT)
    add(cut_extrude2_tool7.solids().sort_by_distance((-9, 3, -1))[0], mode=Mode.SUBTRACT)


solid = part.part
